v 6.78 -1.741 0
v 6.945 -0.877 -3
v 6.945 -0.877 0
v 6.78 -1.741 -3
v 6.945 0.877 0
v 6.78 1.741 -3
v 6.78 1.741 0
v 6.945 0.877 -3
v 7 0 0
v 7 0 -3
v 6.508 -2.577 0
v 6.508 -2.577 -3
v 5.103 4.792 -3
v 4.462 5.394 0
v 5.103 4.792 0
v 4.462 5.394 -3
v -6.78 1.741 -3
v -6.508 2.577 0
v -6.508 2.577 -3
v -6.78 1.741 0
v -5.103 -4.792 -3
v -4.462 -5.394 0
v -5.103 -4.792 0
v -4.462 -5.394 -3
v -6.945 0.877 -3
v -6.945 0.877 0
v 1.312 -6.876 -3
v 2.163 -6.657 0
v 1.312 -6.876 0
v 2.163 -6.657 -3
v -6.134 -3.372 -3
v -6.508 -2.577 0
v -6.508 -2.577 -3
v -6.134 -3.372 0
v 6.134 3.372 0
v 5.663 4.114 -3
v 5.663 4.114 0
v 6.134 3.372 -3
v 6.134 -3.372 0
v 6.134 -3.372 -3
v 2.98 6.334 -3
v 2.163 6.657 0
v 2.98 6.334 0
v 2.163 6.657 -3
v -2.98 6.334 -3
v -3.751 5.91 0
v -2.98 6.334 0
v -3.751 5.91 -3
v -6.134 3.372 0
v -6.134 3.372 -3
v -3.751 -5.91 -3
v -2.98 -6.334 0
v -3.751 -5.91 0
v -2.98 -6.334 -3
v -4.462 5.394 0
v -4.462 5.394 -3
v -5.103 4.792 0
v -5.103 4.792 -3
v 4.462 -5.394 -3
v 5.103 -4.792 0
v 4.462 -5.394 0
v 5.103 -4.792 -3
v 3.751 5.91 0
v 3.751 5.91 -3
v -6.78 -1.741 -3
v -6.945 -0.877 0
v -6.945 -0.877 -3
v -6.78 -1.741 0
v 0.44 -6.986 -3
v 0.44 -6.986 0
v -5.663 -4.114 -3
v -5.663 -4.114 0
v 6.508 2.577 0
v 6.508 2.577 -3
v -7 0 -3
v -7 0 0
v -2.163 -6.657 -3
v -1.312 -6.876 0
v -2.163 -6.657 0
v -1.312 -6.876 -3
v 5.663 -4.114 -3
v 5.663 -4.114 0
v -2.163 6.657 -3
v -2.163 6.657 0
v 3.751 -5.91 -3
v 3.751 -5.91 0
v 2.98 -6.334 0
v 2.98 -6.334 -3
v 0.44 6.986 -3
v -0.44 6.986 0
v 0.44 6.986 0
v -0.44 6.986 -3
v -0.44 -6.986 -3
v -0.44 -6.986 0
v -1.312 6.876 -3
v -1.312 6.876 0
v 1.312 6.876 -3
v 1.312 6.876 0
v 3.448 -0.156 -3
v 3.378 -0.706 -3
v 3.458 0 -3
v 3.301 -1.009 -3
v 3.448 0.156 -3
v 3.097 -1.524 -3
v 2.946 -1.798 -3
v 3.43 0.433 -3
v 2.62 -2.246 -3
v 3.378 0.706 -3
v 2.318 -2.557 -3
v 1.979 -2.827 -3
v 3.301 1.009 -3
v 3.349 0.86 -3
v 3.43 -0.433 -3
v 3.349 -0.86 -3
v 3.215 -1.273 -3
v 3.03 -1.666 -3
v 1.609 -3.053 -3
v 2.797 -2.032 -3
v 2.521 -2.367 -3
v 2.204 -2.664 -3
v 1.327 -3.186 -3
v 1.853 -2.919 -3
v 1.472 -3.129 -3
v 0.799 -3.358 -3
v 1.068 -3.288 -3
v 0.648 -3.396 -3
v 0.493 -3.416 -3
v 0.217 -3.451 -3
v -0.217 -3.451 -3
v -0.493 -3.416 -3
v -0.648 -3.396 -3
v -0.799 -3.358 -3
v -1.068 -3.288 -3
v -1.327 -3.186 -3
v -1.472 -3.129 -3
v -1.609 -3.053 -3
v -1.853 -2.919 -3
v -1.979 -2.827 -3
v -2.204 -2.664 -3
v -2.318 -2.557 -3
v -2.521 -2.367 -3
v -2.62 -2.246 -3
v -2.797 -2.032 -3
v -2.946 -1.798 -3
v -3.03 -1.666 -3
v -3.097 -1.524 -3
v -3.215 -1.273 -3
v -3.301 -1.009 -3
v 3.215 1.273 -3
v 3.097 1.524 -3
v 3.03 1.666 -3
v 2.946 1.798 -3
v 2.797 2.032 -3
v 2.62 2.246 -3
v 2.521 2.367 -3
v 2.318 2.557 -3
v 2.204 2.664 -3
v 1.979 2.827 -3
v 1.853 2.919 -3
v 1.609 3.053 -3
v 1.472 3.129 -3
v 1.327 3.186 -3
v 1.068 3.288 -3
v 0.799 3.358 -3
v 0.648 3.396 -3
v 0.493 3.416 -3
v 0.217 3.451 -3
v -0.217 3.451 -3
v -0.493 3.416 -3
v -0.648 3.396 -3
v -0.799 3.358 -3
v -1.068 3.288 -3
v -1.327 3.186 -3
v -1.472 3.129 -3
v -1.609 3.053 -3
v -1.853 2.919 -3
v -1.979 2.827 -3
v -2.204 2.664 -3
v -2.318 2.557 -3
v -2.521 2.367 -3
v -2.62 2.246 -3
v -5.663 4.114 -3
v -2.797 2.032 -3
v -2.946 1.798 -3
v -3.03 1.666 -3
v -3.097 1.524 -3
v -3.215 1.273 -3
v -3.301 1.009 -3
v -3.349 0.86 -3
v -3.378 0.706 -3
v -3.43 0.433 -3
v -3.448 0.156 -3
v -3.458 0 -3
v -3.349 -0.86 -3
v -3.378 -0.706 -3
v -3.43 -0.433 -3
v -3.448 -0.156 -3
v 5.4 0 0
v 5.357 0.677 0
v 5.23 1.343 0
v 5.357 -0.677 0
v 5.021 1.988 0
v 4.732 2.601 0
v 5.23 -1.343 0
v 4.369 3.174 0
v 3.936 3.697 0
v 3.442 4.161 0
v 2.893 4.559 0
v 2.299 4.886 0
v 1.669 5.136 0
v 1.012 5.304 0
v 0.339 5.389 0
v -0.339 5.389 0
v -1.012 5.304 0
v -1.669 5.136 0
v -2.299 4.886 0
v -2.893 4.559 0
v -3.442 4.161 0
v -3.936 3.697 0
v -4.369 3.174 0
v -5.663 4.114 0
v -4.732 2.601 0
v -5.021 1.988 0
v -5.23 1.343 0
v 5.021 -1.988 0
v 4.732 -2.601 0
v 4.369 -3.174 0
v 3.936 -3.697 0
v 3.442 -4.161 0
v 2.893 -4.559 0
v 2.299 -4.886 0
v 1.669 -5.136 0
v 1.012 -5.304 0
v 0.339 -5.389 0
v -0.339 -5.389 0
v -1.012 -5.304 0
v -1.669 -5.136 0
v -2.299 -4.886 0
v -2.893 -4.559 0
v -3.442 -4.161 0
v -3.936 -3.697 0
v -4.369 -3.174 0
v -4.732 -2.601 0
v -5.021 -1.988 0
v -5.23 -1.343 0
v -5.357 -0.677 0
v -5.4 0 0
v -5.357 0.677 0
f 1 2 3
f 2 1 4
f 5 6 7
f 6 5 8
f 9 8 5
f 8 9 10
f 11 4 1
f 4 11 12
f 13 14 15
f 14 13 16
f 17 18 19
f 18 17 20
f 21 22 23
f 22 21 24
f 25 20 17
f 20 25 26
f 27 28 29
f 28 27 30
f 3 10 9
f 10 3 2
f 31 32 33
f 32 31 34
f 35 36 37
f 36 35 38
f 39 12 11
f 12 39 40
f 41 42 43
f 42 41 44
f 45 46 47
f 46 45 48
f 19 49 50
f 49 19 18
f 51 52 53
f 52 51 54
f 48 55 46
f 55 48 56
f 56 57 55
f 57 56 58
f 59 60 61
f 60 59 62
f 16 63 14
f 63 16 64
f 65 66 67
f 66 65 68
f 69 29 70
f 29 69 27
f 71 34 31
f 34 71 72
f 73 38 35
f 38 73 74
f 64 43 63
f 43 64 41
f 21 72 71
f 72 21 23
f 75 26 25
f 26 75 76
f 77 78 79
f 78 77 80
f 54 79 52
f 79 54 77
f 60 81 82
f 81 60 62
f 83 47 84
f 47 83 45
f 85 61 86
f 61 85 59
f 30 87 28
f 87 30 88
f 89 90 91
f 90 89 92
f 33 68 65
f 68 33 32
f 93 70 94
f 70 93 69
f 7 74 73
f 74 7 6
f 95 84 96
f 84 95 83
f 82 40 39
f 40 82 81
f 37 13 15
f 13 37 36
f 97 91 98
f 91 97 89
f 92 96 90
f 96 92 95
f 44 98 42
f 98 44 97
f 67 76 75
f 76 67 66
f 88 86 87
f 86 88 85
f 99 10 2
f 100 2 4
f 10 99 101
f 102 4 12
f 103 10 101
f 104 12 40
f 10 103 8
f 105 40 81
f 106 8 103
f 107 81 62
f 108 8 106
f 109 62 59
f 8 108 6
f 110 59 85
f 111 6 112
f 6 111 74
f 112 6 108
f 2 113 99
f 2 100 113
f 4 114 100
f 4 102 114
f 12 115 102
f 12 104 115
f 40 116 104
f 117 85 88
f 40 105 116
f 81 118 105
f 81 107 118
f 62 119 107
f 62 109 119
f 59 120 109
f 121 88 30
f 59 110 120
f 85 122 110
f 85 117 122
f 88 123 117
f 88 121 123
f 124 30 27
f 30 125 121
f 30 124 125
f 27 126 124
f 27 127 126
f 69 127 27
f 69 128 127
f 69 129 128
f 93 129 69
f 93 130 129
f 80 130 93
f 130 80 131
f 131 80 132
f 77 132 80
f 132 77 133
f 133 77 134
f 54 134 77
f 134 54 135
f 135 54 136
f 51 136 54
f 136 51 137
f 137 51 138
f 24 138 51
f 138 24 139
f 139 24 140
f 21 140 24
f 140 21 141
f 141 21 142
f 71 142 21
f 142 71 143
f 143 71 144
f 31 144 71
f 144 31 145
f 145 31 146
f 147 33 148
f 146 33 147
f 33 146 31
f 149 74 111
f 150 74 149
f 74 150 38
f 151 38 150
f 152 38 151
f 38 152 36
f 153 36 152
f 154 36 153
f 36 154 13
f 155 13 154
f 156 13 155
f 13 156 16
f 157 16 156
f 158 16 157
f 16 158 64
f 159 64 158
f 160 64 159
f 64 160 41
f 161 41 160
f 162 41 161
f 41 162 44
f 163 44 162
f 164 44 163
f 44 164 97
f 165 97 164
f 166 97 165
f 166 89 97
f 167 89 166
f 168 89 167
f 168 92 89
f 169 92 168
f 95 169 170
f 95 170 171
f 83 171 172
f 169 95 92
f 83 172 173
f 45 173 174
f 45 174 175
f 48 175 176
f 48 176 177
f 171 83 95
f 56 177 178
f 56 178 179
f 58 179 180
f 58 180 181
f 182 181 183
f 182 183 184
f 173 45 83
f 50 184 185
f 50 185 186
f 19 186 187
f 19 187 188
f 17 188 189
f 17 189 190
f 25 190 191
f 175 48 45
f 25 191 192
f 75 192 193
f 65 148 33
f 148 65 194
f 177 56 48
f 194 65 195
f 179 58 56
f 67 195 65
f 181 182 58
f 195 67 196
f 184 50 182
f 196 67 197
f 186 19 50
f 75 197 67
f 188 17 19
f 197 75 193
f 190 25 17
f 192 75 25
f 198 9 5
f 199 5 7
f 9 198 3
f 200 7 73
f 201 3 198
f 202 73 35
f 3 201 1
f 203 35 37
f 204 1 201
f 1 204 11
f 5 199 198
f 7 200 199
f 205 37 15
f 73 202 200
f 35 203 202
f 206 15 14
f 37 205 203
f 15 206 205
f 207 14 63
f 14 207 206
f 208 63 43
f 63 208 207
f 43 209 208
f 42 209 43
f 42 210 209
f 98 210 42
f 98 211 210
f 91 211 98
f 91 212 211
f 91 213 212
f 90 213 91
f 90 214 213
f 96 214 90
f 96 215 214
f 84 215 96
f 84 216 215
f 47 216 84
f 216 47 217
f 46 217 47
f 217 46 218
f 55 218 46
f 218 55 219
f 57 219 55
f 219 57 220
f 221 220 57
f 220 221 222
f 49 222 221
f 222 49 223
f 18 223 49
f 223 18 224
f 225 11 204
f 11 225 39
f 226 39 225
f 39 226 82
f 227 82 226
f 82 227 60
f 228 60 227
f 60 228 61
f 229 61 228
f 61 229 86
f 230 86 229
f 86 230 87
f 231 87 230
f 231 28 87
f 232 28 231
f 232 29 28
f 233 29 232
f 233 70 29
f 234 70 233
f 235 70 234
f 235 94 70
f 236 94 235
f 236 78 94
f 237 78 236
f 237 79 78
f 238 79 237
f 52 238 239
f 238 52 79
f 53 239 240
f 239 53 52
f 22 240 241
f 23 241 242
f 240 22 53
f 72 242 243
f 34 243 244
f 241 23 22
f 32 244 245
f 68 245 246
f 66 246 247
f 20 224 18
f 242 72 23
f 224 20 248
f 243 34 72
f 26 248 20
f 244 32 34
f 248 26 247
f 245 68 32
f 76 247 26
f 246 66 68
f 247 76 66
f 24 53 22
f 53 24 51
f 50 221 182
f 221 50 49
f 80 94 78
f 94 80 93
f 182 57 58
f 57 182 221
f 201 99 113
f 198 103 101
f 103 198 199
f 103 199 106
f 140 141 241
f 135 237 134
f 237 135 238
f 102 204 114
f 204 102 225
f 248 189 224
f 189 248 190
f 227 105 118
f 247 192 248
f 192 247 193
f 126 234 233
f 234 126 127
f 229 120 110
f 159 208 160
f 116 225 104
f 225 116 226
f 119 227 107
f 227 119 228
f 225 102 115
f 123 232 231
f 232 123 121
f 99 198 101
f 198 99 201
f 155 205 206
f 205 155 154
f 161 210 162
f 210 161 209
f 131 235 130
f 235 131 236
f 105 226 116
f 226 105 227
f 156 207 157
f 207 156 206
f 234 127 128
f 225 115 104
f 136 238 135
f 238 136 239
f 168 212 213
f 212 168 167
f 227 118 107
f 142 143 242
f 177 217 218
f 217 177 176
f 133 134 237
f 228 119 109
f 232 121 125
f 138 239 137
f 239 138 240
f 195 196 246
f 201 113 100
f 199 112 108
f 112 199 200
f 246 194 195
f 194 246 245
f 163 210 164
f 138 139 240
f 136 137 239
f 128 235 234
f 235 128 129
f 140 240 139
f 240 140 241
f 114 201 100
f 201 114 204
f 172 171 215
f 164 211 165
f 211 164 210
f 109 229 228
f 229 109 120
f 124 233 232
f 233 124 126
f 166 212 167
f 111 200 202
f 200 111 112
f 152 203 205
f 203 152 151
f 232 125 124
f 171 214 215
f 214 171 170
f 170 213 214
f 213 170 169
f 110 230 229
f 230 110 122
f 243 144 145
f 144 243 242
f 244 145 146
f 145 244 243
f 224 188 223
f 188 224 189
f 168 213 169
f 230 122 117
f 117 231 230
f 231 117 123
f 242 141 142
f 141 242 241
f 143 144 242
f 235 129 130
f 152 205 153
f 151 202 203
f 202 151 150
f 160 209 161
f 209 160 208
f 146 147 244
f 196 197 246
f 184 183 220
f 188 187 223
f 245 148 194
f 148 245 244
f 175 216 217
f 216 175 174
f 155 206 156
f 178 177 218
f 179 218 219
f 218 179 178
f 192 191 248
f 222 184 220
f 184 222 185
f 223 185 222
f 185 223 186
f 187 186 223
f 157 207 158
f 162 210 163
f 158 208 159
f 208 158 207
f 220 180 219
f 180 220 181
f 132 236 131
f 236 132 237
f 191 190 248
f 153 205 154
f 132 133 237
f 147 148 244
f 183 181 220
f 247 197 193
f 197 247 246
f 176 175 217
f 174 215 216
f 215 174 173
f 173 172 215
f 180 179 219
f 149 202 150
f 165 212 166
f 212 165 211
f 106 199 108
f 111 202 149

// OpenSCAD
$fn = 50;

difference() {
	union() {
		translate(v = [0, 0, -3.0]) {
			cylinder(h = 3, r = 7.0);
		}
		#translate(v = [0, 0, -6.0]) {
			cylinder(h = 6, r = 2.875);
		}
	}
	union() {
		translate(v = [0, 0, 0]) {
			rotate(a = [0, 0, 0]) {
				difference() {
					union() {
						translate(v = [0, 0, -6.0]) {
							cylinder(h = 6, r = 2.6);
						}
						translate(v = [0, 0, -3.9]) {
							cylinder(h = 3.9, r1 = 2.875, r2 = 5.4);
						}
						translate(v = [0, 0, -6.0]) {
							cylinder(h = 6, r = 2.875);
						}
						translate(v = [0, 0, -6.0]) {
							cylinder(h = 6, r = 2.6);
						}
					}
					union();
				}
			}
		}
	}
}
